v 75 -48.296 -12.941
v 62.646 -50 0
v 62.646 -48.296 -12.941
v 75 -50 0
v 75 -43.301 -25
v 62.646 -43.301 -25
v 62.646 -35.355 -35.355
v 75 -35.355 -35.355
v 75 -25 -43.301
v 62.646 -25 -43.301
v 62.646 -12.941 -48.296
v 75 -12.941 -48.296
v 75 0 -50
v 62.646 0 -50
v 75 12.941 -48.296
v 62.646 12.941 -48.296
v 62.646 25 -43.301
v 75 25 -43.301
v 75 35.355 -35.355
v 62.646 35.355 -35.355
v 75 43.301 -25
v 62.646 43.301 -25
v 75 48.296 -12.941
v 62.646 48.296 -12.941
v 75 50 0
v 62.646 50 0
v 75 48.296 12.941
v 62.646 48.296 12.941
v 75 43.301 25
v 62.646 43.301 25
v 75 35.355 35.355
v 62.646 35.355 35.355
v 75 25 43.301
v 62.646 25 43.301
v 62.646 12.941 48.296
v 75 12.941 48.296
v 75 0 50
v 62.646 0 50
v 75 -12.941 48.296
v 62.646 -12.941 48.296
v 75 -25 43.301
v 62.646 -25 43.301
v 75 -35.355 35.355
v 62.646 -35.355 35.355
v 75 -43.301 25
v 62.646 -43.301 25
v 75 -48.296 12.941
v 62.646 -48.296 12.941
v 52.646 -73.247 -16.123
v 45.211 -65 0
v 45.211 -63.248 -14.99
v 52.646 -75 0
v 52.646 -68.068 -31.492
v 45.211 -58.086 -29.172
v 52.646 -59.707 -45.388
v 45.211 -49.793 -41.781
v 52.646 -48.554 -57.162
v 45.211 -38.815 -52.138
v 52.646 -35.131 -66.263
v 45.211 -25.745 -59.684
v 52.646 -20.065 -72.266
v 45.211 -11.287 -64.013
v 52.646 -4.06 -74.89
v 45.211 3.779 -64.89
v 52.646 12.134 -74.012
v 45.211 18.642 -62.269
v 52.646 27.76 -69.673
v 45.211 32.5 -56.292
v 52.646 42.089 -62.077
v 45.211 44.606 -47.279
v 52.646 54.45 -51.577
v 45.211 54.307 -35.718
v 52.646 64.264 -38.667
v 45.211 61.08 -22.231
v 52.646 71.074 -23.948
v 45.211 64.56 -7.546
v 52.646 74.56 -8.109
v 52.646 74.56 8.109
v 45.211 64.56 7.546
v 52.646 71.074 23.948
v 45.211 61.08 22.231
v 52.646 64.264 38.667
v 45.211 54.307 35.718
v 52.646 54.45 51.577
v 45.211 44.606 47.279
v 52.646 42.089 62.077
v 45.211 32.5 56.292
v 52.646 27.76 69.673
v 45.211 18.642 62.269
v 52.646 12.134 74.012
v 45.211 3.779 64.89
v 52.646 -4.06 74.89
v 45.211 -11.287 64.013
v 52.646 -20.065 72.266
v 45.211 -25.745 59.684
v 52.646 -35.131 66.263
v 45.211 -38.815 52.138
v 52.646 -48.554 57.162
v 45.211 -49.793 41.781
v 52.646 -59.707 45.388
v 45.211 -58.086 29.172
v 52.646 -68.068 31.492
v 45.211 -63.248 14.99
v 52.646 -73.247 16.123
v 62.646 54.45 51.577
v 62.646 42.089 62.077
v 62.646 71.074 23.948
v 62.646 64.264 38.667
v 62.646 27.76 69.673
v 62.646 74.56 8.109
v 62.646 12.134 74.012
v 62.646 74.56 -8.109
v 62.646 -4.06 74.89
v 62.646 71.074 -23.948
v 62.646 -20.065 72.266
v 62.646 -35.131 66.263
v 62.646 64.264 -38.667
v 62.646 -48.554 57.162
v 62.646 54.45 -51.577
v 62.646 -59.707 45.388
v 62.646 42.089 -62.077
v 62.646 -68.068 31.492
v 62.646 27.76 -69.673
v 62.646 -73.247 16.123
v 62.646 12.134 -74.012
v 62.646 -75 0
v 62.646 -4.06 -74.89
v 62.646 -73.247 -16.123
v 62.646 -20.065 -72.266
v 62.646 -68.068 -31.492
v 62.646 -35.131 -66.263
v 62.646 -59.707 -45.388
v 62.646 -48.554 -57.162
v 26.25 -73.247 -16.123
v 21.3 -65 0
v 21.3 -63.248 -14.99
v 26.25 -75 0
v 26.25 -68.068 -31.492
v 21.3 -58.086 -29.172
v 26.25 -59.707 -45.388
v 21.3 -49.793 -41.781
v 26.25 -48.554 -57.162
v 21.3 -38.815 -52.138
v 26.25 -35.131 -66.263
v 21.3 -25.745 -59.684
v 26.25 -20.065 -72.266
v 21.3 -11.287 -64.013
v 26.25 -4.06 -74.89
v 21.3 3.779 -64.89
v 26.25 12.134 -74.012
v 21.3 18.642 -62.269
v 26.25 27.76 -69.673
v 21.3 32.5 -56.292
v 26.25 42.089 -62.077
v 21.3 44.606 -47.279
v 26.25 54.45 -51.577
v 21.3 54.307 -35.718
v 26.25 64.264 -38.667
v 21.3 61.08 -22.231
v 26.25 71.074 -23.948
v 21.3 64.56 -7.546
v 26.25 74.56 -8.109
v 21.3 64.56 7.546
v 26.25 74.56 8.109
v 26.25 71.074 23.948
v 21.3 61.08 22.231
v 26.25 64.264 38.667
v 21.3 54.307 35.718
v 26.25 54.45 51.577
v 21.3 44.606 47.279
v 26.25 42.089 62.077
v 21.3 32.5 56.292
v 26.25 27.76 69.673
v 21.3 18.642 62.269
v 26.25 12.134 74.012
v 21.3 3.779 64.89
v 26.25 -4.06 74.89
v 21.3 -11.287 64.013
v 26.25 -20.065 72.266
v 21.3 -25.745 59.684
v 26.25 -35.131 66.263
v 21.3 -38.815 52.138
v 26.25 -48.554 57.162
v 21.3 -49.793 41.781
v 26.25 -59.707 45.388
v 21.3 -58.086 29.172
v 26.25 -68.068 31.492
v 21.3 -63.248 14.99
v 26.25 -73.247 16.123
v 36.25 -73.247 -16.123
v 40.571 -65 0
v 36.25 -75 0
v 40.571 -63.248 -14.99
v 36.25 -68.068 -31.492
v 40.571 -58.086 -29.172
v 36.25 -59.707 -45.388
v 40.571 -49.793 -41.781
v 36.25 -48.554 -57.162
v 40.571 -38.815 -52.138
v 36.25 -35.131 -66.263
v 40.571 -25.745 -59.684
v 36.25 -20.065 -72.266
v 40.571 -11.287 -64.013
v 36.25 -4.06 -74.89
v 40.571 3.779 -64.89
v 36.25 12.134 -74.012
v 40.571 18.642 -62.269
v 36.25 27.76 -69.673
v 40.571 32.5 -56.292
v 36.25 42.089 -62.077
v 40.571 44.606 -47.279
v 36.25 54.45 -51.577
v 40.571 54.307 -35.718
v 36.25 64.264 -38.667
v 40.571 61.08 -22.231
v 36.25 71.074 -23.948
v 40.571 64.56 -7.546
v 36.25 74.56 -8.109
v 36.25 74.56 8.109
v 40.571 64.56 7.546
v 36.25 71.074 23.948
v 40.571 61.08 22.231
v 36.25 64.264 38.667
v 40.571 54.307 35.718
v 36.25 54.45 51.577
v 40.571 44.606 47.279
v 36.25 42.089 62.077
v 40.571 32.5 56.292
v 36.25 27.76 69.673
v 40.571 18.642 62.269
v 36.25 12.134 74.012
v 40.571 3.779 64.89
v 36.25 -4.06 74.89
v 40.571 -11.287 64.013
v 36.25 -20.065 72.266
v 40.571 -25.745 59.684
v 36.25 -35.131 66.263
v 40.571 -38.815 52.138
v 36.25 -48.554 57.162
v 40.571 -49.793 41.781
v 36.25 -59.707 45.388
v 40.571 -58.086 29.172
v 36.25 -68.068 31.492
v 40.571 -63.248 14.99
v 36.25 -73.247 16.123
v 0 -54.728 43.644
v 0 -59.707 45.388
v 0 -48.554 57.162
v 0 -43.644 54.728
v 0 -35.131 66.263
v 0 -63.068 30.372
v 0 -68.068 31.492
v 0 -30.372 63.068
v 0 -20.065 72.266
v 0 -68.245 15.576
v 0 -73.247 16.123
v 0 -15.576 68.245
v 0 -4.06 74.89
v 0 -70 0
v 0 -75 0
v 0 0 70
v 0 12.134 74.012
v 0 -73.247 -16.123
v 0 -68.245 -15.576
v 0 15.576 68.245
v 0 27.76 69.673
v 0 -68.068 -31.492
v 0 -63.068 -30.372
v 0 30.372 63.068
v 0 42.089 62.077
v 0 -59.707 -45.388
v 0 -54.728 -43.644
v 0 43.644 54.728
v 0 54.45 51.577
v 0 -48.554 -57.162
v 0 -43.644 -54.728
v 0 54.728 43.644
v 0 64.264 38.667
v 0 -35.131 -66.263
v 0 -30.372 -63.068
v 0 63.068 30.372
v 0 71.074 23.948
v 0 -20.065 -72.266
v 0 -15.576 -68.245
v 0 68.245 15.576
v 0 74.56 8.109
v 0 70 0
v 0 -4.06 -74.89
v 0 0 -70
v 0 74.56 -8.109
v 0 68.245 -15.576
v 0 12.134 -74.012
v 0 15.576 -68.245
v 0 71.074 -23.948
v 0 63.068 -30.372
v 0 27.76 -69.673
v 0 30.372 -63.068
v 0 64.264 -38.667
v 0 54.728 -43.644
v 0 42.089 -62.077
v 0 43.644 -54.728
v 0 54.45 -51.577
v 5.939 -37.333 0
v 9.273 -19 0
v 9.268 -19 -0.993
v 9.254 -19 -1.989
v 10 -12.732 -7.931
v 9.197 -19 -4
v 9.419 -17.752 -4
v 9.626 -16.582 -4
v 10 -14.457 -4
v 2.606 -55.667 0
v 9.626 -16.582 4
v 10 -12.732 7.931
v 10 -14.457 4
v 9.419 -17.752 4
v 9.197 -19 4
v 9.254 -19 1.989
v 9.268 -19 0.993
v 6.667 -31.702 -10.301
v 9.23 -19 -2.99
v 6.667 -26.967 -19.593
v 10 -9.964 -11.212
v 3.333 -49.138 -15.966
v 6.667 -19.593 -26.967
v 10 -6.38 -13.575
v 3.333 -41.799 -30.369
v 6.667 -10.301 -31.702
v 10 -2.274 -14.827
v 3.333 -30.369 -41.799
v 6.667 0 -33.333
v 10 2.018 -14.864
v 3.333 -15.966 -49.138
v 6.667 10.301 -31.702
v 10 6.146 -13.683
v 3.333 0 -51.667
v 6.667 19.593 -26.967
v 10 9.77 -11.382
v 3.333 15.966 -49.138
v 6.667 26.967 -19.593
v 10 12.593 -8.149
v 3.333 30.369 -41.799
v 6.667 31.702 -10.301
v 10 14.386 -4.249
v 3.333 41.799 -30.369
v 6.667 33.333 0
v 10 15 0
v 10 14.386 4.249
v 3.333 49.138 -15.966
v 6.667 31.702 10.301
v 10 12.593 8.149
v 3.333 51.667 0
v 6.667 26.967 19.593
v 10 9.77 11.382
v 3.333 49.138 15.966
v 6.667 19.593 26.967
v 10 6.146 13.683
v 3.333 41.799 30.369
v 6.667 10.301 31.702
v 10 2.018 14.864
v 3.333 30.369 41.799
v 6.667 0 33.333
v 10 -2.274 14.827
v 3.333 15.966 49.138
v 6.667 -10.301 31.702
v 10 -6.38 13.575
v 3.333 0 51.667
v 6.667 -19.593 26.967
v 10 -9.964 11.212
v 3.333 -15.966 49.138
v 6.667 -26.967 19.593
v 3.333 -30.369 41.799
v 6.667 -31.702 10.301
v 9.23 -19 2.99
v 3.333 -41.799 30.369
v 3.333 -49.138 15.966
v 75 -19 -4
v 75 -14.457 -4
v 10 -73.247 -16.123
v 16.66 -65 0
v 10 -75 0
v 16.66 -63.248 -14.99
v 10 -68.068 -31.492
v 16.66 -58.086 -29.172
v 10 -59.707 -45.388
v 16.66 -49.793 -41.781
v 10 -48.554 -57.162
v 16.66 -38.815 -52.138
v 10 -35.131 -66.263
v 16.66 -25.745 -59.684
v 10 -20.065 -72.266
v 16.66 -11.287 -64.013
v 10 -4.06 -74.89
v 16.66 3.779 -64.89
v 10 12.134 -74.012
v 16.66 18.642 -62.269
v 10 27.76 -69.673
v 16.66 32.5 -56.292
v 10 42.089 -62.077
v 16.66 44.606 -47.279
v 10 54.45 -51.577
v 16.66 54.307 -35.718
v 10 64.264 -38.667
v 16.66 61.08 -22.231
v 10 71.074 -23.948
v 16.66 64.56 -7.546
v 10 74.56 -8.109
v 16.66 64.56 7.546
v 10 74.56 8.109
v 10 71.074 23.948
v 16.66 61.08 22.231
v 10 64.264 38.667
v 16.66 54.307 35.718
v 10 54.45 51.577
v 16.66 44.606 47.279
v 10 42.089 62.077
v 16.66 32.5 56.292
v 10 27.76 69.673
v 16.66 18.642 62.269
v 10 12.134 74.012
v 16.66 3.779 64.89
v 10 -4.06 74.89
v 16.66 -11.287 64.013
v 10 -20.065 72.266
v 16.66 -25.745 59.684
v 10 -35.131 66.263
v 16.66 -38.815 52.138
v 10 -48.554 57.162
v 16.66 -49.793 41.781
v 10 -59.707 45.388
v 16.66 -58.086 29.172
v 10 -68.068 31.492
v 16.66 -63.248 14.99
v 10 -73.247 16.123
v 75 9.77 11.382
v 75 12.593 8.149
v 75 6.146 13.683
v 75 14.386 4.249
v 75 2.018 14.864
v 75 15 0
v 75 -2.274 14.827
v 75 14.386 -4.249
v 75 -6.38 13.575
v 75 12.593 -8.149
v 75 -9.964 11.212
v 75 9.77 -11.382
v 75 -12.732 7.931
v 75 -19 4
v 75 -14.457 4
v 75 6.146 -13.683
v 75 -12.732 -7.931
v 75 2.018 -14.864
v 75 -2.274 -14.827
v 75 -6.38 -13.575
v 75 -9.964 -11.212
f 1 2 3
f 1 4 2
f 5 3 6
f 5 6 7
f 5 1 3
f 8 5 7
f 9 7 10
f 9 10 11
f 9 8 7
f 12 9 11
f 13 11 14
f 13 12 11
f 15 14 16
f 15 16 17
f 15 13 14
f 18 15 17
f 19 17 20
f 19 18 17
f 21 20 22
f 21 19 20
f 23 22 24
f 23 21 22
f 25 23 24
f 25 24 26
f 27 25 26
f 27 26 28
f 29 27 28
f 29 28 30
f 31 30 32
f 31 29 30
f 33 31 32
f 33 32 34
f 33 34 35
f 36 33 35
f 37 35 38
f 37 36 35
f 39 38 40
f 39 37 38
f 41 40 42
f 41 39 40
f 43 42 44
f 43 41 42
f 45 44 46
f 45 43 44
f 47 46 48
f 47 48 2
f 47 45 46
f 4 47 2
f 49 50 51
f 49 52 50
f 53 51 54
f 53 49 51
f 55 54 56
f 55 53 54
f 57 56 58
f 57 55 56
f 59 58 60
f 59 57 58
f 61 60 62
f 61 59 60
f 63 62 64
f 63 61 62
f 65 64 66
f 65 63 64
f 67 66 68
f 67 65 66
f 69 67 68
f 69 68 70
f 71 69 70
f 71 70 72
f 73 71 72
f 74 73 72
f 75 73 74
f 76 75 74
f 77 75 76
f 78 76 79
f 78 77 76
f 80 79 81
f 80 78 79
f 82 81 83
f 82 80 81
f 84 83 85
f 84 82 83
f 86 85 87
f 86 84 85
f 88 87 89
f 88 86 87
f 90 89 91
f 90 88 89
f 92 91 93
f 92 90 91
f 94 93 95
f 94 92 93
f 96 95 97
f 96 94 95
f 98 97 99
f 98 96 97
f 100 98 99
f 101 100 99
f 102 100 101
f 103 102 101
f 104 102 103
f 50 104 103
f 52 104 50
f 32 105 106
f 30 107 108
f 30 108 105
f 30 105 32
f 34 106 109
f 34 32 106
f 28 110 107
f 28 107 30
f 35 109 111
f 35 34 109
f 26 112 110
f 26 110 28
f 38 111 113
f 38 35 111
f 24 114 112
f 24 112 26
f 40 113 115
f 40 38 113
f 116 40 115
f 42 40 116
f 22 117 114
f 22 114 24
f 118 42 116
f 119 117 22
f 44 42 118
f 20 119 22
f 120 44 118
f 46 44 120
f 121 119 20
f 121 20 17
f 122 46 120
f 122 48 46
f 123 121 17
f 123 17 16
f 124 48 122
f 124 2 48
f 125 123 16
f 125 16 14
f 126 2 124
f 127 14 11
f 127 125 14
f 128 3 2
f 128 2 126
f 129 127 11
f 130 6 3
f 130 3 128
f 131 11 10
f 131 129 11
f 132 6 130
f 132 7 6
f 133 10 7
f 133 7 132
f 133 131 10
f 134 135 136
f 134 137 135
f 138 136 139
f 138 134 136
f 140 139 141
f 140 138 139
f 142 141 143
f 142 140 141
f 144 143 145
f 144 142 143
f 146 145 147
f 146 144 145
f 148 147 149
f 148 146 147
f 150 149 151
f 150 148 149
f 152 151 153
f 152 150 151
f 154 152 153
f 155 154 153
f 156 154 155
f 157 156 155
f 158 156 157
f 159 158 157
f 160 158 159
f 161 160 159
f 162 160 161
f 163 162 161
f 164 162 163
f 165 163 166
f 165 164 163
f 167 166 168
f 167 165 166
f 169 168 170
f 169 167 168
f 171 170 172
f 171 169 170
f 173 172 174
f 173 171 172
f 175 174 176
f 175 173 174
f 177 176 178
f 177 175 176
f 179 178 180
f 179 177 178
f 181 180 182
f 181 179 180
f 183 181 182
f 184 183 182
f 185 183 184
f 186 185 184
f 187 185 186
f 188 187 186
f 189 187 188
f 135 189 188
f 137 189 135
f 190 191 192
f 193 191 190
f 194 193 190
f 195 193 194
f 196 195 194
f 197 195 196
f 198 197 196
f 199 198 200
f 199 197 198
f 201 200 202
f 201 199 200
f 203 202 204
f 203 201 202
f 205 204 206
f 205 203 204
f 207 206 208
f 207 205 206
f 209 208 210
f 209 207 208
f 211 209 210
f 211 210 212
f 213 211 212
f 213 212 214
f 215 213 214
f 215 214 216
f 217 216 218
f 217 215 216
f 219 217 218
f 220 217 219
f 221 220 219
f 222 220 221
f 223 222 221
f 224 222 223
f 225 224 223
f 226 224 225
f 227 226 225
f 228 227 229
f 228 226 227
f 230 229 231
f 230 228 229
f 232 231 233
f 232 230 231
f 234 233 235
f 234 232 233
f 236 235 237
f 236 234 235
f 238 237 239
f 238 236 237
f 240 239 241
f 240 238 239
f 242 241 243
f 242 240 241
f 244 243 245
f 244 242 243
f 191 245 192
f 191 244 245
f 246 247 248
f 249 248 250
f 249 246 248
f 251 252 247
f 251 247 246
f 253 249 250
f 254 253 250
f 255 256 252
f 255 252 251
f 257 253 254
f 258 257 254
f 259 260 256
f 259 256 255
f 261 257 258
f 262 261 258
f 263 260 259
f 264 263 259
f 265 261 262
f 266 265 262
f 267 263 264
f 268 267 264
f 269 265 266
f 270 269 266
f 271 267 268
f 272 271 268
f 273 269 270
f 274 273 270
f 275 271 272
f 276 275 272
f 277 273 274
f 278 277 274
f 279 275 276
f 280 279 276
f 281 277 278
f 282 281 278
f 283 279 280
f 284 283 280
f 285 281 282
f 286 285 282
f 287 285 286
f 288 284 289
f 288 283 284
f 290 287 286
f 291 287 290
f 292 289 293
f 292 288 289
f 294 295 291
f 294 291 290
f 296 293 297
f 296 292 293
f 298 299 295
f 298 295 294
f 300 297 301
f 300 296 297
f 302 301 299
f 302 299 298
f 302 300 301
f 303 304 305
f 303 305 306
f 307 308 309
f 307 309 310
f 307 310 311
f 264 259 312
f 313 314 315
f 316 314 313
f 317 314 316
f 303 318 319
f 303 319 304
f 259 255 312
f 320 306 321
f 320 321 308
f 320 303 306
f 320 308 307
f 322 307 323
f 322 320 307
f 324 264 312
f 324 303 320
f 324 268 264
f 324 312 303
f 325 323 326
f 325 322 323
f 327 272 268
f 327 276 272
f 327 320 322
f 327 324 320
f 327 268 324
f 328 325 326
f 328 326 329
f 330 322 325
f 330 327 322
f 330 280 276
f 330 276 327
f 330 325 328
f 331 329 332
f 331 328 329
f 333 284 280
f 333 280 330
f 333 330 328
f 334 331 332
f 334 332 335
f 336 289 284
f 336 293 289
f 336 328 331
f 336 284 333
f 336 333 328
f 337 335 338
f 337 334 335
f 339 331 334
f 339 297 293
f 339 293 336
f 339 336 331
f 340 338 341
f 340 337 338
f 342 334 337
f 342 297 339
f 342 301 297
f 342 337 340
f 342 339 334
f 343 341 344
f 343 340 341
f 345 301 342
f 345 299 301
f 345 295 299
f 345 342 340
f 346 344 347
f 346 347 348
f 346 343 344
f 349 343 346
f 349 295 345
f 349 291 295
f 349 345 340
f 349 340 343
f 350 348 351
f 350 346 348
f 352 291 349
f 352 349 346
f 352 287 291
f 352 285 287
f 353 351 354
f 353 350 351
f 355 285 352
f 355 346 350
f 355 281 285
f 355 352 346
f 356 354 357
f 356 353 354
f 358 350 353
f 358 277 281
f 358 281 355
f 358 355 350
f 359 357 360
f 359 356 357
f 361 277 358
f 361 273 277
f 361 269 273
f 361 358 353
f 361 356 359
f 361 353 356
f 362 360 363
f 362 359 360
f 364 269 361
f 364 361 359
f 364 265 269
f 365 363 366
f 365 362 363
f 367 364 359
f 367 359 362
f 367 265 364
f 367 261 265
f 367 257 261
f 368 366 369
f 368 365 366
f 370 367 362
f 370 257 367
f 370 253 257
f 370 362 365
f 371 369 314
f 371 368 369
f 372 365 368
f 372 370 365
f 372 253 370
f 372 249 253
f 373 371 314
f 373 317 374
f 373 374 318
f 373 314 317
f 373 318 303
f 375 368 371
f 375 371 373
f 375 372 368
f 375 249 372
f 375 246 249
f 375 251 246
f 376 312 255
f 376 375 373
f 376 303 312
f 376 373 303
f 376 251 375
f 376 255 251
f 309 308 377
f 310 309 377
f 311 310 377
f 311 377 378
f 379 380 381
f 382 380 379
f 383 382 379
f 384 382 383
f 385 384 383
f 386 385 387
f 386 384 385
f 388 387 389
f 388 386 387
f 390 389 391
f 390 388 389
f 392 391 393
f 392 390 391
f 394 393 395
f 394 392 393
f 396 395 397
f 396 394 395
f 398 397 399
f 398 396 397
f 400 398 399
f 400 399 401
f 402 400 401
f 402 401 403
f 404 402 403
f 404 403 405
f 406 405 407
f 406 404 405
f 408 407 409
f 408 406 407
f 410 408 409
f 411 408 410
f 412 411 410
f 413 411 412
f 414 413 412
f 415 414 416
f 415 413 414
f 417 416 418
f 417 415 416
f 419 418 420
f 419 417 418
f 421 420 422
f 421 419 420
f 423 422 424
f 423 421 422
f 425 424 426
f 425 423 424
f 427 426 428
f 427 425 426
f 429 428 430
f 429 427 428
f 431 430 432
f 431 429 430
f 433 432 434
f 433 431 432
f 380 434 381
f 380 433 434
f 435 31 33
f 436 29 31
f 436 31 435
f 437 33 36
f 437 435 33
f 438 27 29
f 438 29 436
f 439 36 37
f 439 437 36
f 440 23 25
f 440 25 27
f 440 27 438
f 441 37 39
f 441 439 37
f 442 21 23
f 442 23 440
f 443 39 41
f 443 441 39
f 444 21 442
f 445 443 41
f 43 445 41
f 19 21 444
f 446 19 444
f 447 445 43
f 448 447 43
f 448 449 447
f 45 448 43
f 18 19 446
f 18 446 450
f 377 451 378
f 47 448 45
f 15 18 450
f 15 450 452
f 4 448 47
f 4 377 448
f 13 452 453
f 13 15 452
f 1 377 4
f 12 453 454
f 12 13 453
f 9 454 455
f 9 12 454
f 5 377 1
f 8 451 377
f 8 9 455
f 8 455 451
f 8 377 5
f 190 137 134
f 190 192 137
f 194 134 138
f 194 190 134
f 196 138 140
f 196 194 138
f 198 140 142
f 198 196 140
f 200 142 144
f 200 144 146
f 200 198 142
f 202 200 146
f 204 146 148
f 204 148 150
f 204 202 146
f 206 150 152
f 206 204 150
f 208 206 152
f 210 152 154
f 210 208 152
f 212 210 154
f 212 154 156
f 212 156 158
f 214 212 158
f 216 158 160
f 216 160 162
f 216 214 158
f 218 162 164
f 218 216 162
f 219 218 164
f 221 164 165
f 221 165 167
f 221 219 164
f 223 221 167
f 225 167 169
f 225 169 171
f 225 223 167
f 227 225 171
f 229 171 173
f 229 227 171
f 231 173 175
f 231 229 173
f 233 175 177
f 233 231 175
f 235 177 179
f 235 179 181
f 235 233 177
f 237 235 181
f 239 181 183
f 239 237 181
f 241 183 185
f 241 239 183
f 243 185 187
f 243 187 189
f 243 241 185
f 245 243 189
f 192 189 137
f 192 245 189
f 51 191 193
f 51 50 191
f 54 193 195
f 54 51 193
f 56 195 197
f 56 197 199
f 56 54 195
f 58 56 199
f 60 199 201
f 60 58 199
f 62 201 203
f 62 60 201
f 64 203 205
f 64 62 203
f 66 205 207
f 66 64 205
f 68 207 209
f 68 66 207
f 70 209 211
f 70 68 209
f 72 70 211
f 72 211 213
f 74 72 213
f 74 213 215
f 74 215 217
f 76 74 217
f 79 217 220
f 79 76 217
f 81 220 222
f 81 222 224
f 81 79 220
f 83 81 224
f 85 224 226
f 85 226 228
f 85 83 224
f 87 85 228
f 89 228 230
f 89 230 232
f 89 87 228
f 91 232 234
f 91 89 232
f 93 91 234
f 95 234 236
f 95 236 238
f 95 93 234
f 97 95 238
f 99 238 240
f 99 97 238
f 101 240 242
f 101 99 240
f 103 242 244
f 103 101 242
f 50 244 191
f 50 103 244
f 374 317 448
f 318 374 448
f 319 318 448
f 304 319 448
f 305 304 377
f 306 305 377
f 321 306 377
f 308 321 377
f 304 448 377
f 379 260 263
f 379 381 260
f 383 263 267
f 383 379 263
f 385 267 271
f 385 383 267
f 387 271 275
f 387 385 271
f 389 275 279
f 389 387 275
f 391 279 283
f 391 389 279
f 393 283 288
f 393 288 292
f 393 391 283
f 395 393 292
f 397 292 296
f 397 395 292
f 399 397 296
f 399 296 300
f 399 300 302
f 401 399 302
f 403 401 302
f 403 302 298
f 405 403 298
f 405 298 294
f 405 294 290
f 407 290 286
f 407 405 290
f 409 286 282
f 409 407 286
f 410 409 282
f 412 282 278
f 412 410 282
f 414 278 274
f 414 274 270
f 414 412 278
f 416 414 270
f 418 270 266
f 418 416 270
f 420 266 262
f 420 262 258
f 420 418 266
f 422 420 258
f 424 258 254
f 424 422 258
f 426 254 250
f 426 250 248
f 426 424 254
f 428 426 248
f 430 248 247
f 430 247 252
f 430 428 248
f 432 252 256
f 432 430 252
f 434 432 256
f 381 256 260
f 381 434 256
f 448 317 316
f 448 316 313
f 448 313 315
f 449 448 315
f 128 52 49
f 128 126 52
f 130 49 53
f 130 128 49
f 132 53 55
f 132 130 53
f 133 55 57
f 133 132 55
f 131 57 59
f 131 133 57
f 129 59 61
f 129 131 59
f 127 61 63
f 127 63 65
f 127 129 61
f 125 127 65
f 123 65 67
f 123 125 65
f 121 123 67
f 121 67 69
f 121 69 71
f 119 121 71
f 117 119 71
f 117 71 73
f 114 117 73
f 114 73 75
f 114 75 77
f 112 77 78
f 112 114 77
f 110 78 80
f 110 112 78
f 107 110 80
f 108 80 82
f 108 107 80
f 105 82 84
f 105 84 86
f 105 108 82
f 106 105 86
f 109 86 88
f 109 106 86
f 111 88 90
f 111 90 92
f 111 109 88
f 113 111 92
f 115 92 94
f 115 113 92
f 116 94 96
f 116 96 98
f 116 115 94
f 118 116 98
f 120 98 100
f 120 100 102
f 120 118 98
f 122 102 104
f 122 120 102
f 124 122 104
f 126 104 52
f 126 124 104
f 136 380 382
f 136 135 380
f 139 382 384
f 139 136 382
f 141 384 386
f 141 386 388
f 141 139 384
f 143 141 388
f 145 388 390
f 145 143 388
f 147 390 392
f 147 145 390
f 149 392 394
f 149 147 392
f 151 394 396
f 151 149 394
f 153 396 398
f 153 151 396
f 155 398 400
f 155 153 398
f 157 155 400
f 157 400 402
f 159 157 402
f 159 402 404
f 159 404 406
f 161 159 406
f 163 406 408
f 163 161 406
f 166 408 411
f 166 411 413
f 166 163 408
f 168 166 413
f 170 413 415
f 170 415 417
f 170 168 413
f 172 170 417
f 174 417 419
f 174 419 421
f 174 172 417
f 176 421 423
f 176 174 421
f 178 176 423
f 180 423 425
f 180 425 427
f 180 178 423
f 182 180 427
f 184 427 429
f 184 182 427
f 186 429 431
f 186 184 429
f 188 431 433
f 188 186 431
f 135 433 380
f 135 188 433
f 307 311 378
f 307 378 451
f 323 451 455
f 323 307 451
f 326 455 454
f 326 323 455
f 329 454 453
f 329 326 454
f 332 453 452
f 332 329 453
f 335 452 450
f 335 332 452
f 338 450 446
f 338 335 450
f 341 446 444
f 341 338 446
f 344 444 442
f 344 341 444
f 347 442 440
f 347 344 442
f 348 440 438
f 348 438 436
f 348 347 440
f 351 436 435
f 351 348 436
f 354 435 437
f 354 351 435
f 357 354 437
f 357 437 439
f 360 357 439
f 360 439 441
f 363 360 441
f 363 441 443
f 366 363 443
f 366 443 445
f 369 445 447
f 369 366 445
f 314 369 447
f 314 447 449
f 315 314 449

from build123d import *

# Parameters (mm, degrees)
SKETCH2_W          = 8
SKETCH2_H          = 8
CUT_EXTRUDE1_DEPTH = 76


with BuildPart() as part:
    # Sketch1 → Revolve1 (revolve)
    with BuildSketch(Plane.XY):
        Polygon((75, -15), (10, -15), (0, -70), (0, -75), (10, -75), (16.659953574, -65), (21.299953574, -65), (26.250205442, -75), (36.250205442, -75), (40.571282755, -65), (45.211282755, -65), (52.646188266, -75), (62.646188266, -75), (62.646188266, -50), (75, -50), align=None)
    revolve(axis=Axis((0, 0, 0), (1, 0, 0)))

    # Sketch2 → Cut-Extrude1 (cut, through all)
    with BuildSketch(Plane(origin=(75, 0, 0), x_dir=(0, 0, -1), z_dir=(1, 0, 0))):
        with Locations((0, -15)):
            Rectangle(SKETCH2_W, SKETCH2_H)
    extrude(amount=-CUT_EXTRUDE1_DEPTH, mode=Mode.SUBTRACT)


solid = part.part
